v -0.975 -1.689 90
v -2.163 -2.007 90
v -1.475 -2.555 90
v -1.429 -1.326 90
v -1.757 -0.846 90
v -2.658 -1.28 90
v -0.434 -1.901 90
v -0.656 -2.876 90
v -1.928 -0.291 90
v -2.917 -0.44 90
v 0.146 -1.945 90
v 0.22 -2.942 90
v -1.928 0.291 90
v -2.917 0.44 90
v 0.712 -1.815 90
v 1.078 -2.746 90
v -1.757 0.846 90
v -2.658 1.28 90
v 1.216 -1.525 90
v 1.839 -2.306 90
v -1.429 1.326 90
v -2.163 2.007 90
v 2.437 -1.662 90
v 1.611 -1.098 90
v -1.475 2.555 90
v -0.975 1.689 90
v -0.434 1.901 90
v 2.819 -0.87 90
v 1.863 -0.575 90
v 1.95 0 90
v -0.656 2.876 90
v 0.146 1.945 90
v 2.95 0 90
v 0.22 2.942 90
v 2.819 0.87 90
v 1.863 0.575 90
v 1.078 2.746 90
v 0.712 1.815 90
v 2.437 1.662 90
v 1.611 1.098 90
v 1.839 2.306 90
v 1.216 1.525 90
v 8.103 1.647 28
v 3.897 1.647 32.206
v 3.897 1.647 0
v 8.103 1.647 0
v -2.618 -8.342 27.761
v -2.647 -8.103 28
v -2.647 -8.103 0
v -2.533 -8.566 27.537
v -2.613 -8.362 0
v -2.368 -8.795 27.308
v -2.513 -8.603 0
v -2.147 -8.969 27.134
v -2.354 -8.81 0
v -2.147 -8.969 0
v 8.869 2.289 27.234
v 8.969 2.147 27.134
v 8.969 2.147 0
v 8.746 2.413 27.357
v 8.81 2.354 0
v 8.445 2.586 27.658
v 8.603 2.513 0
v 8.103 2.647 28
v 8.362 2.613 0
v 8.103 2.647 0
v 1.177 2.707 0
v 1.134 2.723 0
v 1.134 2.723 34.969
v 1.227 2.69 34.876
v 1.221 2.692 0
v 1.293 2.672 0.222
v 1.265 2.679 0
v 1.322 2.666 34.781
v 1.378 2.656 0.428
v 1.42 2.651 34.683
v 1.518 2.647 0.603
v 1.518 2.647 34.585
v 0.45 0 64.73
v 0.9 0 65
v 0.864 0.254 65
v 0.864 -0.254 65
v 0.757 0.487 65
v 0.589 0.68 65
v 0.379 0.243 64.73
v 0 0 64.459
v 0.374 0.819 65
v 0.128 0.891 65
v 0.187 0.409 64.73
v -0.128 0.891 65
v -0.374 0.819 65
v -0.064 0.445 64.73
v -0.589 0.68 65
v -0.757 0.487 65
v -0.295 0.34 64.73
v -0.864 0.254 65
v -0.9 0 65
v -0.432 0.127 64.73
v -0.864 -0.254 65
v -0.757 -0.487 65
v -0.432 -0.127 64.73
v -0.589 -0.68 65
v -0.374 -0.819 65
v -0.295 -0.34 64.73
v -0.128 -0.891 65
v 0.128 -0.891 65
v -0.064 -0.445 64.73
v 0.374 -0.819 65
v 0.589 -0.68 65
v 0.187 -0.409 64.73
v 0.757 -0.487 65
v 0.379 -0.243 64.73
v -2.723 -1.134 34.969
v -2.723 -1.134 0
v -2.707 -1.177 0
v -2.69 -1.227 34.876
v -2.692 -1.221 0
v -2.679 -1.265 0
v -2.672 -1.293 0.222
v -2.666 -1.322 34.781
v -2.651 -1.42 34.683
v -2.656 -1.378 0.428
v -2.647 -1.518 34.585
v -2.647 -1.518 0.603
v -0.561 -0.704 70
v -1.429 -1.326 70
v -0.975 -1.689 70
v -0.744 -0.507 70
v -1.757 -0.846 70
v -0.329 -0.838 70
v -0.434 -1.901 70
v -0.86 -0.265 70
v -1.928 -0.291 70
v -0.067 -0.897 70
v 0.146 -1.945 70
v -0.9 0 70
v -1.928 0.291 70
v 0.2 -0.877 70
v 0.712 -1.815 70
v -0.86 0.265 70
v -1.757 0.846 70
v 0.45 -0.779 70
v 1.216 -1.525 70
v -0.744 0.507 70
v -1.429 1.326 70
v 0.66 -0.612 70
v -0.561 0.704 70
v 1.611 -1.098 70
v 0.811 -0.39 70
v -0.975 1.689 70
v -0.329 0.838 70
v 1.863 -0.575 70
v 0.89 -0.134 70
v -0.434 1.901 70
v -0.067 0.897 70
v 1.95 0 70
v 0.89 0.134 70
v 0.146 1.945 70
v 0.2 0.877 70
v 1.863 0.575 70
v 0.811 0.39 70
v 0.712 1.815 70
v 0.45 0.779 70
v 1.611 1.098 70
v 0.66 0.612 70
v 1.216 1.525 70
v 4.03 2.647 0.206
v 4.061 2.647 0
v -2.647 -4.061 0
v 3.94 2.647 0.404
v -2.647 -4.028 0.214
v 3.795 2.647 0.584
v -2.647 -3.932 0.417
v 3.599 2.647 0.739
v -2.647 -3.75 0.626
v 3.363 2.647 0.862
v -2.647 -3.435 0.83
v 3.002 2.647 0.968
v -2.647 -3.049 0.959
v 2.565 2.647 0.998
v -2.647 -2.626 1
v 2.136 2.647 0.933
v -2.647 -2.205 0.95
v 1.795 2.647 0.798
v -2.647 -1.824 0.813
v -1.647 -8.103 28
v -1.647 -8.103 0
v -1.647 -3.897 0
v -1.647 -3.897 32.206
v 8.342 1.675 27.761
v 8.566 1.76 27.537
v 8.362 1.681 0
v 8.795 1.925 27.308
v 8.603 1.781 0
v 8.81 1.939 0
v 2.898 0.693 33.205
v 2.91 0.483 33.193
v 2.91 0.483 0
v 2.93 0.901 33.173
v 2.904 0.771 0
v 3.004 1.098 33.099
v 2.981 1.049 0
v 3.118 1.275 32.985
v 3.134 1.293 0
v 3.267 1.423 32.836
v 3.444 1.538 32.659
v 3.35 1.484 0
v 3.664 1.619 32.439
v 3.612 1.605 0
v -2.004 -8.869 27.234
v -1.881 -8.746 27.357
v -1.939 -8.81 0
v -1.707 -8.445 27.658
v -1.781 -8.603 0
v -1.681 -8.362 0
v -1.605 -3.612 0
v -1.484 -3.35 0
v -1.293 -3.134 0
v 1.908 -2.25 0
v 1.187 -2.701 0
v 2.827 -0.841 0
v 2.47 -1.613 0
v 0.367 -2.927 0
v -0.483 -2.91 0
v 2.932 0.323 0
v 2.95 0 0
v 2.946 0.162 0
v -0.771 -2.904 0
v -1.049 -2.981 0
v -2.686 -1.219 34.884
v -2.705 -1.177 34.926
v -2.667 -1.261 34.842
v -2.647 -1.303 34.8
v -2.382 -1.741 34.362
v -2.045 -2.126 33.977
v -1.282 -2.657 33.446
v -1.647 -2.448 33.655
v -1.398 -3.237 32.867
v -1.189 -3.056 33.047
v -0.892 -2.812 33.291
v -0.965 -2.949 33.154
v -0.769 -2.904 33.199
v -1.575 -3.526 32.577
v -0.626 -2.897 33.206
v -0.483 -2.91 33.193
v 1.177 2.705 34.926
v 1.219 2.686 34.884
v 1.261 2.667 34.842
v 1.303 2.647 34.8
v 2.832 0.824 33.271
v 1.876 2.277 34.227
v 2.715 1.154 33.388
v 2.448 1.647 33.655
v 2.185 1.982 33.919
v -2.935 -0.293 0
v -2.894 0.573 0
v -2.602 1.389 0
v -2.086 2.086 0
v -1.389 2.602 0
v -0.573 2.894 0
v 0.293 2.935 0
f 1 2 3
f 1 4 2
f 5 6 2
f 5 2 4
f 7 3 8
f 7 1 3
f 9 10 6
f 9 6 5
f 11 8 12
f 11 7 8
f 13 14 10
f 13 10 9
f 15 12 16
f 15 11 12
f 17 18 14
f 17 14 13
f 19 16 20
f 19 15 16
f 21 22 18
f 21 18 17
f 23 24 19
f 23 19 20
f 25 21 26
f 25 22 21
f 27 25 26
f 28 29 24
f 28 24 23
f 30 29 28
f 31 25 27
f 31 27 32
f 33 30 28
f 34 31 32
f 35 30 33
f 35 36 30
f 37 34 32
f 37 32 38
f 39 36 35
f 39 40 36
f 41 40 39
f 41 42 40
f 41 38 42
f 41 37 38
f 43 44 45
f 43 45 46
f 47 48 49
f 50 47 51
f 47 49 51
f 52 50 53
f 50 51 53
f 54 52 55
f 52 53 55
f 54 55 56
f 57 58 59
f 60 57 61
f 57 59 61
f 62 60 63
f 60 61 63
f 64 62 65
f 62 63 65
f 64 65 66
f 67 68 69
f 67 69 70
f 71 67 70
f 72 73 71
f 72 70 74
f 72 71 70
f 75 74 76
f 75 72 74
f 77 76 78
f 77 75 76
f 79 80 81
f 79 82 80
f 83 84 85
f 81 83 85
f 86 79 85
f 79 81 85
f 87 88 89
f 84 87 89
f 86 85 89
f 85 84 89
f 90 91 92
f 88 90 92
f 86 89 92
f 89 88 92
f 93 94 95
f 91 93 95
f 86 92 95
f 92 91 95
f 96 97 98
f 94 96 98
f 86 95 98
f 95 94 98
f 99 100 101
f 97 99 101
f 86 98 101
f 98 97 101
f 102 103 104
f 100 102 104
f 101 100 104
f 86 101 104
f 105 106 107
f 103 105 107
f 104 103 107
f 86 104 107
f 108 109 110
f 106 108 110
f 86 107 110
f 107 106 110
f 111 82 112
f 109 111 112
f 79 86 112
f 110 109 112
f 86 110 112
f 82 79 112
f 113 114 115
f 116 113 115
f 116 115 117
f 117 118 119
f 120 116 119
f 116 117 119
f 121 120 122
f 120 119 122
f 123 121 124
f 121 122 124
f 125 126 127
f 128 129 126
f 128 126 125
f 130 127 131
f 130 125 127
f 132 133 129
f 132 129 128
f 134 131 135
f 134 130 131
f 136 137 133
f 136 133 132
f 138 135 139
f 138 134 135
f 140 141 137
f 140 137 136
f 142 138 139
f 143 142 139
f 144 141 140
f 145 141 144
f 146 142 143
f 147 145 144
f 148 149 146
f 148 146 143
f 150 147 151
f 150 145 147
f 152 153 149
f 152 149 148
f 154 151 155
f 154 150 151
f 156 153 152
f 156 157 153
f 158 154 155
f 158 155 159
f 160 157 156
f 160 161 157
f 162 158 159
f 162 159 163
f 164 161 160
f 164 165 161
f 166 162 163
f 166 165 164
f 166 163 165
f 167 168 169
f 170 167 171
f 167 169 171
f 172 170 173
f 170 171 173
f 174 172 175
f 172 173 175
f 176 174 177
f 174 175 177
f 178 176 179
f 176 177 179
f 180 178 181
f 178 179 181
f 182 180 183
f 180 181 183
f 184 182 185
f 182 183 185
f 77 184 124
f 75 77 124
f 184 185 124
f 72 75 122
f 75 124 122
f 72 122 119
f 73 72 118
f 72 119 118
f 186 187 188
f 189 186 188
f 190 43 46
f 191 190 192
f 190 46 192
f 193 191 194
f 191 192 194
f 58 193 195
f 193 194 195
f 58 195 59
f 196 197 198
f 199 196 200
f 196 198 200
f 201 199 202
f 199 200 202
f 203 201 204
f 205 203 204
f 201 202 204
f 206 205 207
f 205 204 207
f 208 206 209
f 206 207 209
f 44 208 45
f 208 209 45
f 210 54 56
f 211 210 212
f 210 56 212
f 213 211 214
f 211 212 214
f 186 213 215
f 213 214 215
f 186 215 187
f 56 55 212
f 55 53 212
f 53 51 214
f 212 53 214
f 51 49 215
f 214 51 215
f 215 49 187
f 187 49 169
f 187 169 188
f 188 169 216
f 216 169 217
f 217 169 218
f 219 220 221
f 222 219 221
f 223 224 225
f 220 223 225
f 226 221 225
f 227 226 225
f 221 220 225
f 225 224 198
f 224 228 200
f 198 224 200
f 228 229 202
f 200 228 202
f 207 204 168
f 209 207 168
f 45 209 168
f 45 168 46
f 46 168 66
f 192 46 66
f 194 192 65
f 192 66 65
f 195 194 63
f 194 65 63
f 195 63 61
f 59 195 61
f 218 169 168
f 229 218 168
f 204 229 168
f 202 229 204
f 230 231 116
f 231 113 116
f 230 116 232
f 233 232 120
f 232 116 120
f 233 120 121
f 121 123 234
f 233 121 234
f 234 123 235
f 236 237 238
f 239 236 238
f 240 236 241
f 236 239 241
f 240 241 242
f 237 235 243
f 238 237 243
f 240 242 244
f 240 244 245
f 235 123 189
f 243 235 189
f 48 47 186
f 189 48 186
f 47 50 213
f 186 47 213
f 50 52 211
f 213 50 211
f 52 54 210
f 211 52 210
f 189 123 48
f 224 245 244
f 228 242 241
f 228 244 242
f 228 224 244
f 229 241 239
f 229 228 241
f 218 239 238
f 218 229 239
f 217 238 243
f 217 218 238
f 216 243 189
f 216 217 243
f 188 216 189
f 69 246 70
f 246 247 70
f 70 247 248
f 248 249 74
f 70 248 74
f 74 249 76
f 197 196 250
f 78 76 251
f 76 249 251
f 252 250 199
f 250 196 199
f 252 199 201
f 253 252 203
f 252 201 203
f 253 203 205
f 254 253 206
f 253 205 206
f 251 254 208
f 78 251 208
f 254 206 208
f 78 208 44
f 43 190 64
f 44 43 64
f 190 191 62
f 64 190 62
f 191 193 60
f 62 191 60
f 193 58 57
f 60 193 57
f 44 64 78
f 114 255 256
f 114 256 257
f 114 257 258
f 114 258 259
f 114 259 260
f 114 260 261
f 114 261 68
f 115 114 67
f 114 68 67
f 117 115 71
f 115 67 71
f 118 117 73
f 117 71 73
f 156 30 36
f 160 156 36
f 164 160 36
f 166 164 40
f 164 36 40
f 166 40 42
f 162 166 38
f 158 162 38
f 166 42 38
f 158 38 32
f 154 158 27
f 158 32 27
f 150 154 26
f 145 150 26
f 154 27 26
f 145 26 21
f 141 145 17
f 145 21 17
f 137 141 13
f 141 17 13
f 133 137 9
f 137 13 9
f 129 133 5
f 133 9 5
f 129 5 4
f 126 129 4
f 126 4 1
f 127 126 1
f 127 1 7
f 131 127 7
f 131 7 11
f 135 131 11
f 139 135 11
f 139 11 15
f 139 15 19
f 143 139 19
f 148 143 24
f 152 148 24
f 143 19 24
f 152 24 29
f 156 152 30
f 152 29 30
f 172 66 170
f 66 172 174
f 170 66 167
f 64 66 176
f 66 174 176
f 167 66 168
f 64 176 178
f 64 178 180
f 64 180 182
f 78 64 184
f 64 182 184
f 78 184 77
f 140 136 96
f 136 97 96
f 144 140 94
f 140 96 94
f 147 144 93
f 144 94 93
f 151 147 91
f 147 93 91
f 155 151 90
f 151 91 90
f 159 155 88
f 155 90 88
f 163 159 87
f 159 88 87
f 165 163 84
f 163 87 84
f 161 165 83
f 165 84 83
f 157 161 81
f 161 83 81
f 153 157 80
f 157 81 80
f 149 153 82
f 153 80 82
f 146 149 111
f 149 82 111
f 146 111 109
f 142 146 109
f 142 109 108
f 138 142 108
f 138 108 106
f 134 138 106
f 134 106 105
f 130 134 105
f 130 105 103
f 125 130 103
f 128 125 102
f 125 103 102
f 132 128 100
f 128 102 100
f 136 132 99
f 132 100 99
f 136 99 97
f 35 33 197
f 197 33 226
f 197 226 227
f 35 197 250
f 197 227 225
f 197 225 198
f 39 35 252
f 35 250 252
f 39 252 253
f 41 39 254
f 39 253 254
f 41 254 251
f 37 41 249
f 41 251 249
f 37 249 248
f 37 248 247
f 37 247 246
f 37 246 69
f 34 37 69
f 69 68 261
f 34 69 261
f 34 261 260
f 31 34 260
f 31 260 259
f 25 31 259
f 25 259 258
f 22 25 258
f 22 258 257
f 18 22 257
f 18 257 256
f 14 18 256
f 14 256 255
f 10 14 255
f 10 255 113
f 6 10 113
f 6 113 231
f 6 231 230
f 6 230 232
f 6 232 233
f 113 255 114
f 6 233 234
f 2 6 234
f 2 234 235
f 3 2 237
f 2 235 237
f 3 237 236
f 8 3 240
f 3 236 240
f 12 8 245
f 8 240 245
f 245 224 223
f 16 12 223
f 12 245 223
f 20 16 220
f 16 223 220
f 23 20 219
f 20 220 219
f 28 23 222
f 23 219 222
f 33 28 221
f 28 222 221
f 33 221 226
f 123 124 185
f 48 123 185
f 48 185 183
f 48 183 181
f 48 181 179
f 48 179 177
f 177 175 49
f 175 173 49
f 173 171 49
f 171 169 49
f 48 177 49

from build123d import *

# Parameters (mm, degrees)
F0_R         = 2.95
F1_DEPTH     = 95
F3_DEPTH     = 35
F4_T4_DEPTH  = 1
F4_S5_R      = 2.95
F4_T6_DEPTH  = 8
F4_T10_DEPTH = 1
F4_S11_R     = 2.95
F4_T12_DEPTH = 8
F5_T4_DEPTH  = 37.2779404698
F5_T9_DEPTH  = 35.3377138687
F5_T14_DEPTH = 35.3377138687
F5_T19_DEPTH = 37.2779404698
F5_T21_DEPTH = 32
F9_R         = 1
F10_DEPTH    = 12.5
F11_DEPTH    = 5
F12_R        = 1.95
F13_DEPTH    = 20
F15_D        = 1.8
F15_DEPTH    = 5
F15_TIP      = 0.5407745571


# Not quite as in the source:
# - a fillet or chamfer that OpenCascade refuses, or shapes differently, is made with other operations: its cross-section is extruded or revolved along the edge and cut away or added


with BuildPart() as f1:
    # F0 (on Top) → F1 (new body)
    with BuildSketch(Plane.XY):
        Circle(F0_R)
    extrude(amount=F1_DEPTH)

    # F2 (on Top) → F3 (join)
    with BuildSketch(Plane.XY):
        Polygon((1.3030903237, 2.6465932079), (2.4476990844, 1.6465932079), (9.1030903237, 1.6465932079), (9.1030903237, 2.6465932079), align=None)
        Polygon((-2.6465932079, -9.1030903237), (-1.6465932079, -9.1030903237), (-1.6465932079, -2.4476990844), (-2.6465932079, -1.3030903237), align=None)
    extrude(amount=F3_DEPTH)

    # F4: chamfer of 8 on 2 edges, made by hand


with BuildPart() as f4_tool2:
    # F4_s3 → F4_t4 (new body)
    with BuildSketch(Plane.XZ.offset(-1.6465932079)):
        with BuildLine():
            Line((0.8768161537, 35.22627417), (9.3293644937, 26.77372583))
            Line((9.3293644937, 26.77372583), (9.4893644937, 26.77372583))
            ThreePointArc((9.4893644937, 26.77372583), (9.2630903237, 30.886862915), (9.2630903237, 35))
            Line((9.2630903237, 35), (9.1030903237, 35.16))
            ThreePointArc((9.1030903237, 35.16), (4.9899532387, 35.16), (0.8768161537, 35.38627417))
            Line((0.8768161537, 35.38627417), (0.8768161537, 35.22627417))
        make_face()
    extrude(amount=-F4_T4_DEPTH)

    # F4_s5 → F4_t6 (cut, symmetric)
    with BuildSketch(Plane.XY.offset(31.1)):
        Circle(F4_S5_R)
    extrude(amount=F4_T6_DEPTH, both=True, mode=Mode.SUBTRACT)


with BuildPart() as f1_1:
    add(f1.part)

    # F4_t1: cut F4_tool2
    add(f4_tool2.part, mode=Mode.SUBTRACT)


with BuildPart() as f4_tool8:
    # F4_s9 → F4_t10 (new body)
    with BuildSketch(Plane.YZ.offset(-2.6465932079)):
        with BuildLine():
            Line((-0.8768161537, 35.22627417), (-9.3293644937, 26.77372583))
            Line((-9.3293644937, 26.77372583), (-9.4893644937, 26.77372583))
            ThreePointArc((-9.4893644937, 26.77372583), (-9.2630903237, 30.886862915), (-9.2630903237, 35))
            Line((-9.2630903237, 35), (-9.1030903237, 35.16))
            ThreePointArc((-9.1030903237, 35.16), (-4.9899532387, 35.16), (-0.8768161537, 35.38627417))
            Line((-0.8768161537, 35.38627417), (-0.8768161537, 35.22627417))
        make_face()
    extrude(amount=F4_T10_DEPTH)

    # F4_s11 → F4_t12 (cut, symmetric)
    with BuildSketch(Plane.XY.offset(31.1)):
        Circle(F4_S11_R)
    extrude(amount=F4_T12_DEPTH, both=True, mode=Mode.SUBTRACT)


with BuildPart() as f1_2:
    add(f1_1.part)

    # F4_t7: cut F4_tool8
    add(f4_tool8.part, mode=Mode.SUBTRACT)

    # F5: fillet of radius 1 on 8 edges, made by hand


with BuildPart() as f5_tool2:
    # F5_s3 → F5_t4 (new body)
    with BuildSketch(Plane.XY):
        with BuildLine():
            ThreePointArc((-0.4828987249, -2.9102076939), (-1.2932405295, -3.1339296566), (-1.6465932079, -3.8967187765))
            Line((-1.6465932079, -3.8967187765), (-1.6465932079, -2.4476990844))
            ThreePointArc((-1.6465932079, -2.4476990844), (-1.0895698814, -2.7414115841), (-0.4828987249, -2.9102076939))
        make_face()
    extrude(amount=F5_T4_DEPTH)

    split(bisect_by=Plane(origin=(0, -18.0515451619, 18.0515451618), x_dir=(1, 0, 0), z_dir=(0, 0.7071067812, -0.7071067812)), keep=Keep.TOP)


with BuildPart() as f1_3:
    add(f1_2.part)

    # F5_t1: union F5_tool2
    add(f5_tool2.part)


with BuildPart() as f5_tool7:
    # F5_s8 → F5_t9 (new body)
    with BuildSketch(Plane.XY):
        with BuildLine():
            ThreePointArc((-2.723405054, -1.1338275494), (-2.6659841743, -1.3222015794), (-2.6465932079, -1.5181758712))
            Line((-2.6465932079, -1.5181758712), (-2.6465932079, -1.3030903237))
            ThreePointArc((-2.6465932079, -1.3030903237), (-2.6863325939, -1.2190640651), (-2.723405054, -1.1338275494))
        make_face()
    extrude(amount=F5_T9_DEPTH)

    split(bisect_by=Plane(origin=(0, -18.0515451619, 18.0515451618), x_dir=(1, 0, 0), z_dir=(0, 0.7071067812, -0.7071067812)), keep=Keep.TOP)


with BuildPart() as f1_4:
    add(f1_3.part)

    # F5_t6: union F5_tool7
    add(f5_tool7.part)


with BuildPart() as f5_tool12:
    # F5_s13 → F5_t14 (new body)
    with BuildSketch(Plane.XY):
        with BuildLine():
            ThreePointArc((1.1338275494, 2.723405054), (1.3222015794, 2.6659841743), (1.5181758712, 2.6465932079))
            Line((1.5181758712, 2.6465932079), (1.3030903237, 2.6465932079))
            ThreePointArc((1.3030903237, 2.6465932079), (1.2190640651, 2.6863325939), (1.1338275494, 2.723405054))
        make_face()
    extrude(amount=F5_T14_DEPTH)

    split(bisect_by=Plane(origin=(18.0515451619, 0, 18.0515451618), x_dir=(0, 1, 0), z_dir=(-0.7071067812, 0, -0.7071067812)), keep=Keep.TOP)


with BuildPart() as f1_5:
    add(f1_4.part)

    # F5_t11: union F5_tool12
    add(f5_tool12.part)


with BuildPart() as f5_tool17:
    # F5_s18 → F5_t19 (new body)
    with BuildSketch(Plane.XY):
        with BuildLine():
            ThreePointArc((2.9102076939, 0.4828987249), (3.1339296566, 1.2932405295), (3.8967187765, 1.6465932079))
            Line((3.8967187765, 1.6465932079), (2.4476990844, 1.6465932079))
            ThreePointArc((2.4476990844, 1.6465932079), (2.7414115841, 1.0895698814), (2.9102076939, 0.4828987249))
        make_face()
    extrude(amount=F5_T19_DEPTH)

    split(bisect_by=Plane(origin=(18.0515451619, 0, 18.0515451618), x_dir=(0, 1, 0), z_dir=(-0.7071067812, 0, -0.7071067812)), keep=Keep.TOP)


with BuildPart() as f1_6:
    add(f1_5.part)

    # F5_t16: union F5_tool17
    add(f5_tool17.part)

    # F5_s22 → F5_t21 (cut)
    with BuildSketch(Plane.XY.offset(-2.5)):
        with BuildLine():
            ThreePointArc((8.1030903237, 1.6465932079), (8.8101971049, 1.9394864268), (9.1030903237, 2.6465932079))
            Line((9.1030903237, 2.6465932079), (9.1030903237, 1.6465932079))
            Line((9.1030903237, 1.6465932079), (8.1030903237, 1.6465932079))
        make_face()
        with BuildLine():
            ThreePointArc((9.1030903237, 1.6465932079), (8.8101971049, 2.3536999891), (8.1030903237, 2.6465932079))
            Line((8.1030903237, 2.6465932079), (9.1030903237, 2.6465932079))
            Line((9.1030903237, 2.6465932079), (9.1030903237, 1.6465932079))
        make_face()
        with BuildLine():
            ThreePointArc((-2.6465932079, -8.1030903237), (-2.3536999891, -8.8101971049), (-1.6465932079, -9.1030903237))
            Line((-1.6465932079, -9.1030903237), (-2.6465932079, -9.1030903237))
            Line((-2.6465932079, -9.1030903237), (-2.6465932079, -8.1030903237))
        make_face()
        with BuildLine():
            ThreePointArc((-2.6465932079, -9.1030903237), (-1.9394864268, -8.8101971049), (-1.6465932079, -8.1030903237))
            Line((-1.6465932079, -8.1030903237), (-1.6465932079, -9.1030903237))
            Line((-1.6465932079, -9.1030903237), (-2.6465932079, -9.1030903237))
        make_face()
    extrude(amount=F5_T21_DEPTH, mode=Mode.SUBTRACT)

    # F9 (on 3pt) → F10 (cut, symmetric)
    with BuildSketch(Plane(origin=(0, 0, 0), x_dir=(0.7071067812, -0.7071067812, 0), z_dir=(-0.7071067812, -0.7071067812, 0))):
        Circle(F9_R)
    extrude(amount=F10_DEPTH, both=True, mode=Mode.SUBTRACT)

    # F11 (cut): a face of the model
    f11_faces = [f1_6.faces().sort_by_distance(p)[0] for p in [
        (0, 0, 95),
    ]]
    extrude(f11_faces, amount=-F11_DEPTH, mode=Mode.SUBTRACT)

    # F12 (on face) → F13 (cut)
    with BuildSketch(Plane.XY.offset(90)):
        Circle(F12_R)
    extrude(amount=-F13_DEPTH, mode=Mode.SUBTRACT)

    # F15
    with Locations(Plane.XY.offset(70)):
        with Locations((0, 0)):
            Hole(F15_D / 2, depth=F15_DEPTH)
            with Locations((0, 0, -(F15_DEPTH + F15_TIP / 2))):  # 118° drill point
                Cone(0, F15_D / 2, F15_TIP, mode=Mode.SUBTRACT)


solid = f1_6.part
